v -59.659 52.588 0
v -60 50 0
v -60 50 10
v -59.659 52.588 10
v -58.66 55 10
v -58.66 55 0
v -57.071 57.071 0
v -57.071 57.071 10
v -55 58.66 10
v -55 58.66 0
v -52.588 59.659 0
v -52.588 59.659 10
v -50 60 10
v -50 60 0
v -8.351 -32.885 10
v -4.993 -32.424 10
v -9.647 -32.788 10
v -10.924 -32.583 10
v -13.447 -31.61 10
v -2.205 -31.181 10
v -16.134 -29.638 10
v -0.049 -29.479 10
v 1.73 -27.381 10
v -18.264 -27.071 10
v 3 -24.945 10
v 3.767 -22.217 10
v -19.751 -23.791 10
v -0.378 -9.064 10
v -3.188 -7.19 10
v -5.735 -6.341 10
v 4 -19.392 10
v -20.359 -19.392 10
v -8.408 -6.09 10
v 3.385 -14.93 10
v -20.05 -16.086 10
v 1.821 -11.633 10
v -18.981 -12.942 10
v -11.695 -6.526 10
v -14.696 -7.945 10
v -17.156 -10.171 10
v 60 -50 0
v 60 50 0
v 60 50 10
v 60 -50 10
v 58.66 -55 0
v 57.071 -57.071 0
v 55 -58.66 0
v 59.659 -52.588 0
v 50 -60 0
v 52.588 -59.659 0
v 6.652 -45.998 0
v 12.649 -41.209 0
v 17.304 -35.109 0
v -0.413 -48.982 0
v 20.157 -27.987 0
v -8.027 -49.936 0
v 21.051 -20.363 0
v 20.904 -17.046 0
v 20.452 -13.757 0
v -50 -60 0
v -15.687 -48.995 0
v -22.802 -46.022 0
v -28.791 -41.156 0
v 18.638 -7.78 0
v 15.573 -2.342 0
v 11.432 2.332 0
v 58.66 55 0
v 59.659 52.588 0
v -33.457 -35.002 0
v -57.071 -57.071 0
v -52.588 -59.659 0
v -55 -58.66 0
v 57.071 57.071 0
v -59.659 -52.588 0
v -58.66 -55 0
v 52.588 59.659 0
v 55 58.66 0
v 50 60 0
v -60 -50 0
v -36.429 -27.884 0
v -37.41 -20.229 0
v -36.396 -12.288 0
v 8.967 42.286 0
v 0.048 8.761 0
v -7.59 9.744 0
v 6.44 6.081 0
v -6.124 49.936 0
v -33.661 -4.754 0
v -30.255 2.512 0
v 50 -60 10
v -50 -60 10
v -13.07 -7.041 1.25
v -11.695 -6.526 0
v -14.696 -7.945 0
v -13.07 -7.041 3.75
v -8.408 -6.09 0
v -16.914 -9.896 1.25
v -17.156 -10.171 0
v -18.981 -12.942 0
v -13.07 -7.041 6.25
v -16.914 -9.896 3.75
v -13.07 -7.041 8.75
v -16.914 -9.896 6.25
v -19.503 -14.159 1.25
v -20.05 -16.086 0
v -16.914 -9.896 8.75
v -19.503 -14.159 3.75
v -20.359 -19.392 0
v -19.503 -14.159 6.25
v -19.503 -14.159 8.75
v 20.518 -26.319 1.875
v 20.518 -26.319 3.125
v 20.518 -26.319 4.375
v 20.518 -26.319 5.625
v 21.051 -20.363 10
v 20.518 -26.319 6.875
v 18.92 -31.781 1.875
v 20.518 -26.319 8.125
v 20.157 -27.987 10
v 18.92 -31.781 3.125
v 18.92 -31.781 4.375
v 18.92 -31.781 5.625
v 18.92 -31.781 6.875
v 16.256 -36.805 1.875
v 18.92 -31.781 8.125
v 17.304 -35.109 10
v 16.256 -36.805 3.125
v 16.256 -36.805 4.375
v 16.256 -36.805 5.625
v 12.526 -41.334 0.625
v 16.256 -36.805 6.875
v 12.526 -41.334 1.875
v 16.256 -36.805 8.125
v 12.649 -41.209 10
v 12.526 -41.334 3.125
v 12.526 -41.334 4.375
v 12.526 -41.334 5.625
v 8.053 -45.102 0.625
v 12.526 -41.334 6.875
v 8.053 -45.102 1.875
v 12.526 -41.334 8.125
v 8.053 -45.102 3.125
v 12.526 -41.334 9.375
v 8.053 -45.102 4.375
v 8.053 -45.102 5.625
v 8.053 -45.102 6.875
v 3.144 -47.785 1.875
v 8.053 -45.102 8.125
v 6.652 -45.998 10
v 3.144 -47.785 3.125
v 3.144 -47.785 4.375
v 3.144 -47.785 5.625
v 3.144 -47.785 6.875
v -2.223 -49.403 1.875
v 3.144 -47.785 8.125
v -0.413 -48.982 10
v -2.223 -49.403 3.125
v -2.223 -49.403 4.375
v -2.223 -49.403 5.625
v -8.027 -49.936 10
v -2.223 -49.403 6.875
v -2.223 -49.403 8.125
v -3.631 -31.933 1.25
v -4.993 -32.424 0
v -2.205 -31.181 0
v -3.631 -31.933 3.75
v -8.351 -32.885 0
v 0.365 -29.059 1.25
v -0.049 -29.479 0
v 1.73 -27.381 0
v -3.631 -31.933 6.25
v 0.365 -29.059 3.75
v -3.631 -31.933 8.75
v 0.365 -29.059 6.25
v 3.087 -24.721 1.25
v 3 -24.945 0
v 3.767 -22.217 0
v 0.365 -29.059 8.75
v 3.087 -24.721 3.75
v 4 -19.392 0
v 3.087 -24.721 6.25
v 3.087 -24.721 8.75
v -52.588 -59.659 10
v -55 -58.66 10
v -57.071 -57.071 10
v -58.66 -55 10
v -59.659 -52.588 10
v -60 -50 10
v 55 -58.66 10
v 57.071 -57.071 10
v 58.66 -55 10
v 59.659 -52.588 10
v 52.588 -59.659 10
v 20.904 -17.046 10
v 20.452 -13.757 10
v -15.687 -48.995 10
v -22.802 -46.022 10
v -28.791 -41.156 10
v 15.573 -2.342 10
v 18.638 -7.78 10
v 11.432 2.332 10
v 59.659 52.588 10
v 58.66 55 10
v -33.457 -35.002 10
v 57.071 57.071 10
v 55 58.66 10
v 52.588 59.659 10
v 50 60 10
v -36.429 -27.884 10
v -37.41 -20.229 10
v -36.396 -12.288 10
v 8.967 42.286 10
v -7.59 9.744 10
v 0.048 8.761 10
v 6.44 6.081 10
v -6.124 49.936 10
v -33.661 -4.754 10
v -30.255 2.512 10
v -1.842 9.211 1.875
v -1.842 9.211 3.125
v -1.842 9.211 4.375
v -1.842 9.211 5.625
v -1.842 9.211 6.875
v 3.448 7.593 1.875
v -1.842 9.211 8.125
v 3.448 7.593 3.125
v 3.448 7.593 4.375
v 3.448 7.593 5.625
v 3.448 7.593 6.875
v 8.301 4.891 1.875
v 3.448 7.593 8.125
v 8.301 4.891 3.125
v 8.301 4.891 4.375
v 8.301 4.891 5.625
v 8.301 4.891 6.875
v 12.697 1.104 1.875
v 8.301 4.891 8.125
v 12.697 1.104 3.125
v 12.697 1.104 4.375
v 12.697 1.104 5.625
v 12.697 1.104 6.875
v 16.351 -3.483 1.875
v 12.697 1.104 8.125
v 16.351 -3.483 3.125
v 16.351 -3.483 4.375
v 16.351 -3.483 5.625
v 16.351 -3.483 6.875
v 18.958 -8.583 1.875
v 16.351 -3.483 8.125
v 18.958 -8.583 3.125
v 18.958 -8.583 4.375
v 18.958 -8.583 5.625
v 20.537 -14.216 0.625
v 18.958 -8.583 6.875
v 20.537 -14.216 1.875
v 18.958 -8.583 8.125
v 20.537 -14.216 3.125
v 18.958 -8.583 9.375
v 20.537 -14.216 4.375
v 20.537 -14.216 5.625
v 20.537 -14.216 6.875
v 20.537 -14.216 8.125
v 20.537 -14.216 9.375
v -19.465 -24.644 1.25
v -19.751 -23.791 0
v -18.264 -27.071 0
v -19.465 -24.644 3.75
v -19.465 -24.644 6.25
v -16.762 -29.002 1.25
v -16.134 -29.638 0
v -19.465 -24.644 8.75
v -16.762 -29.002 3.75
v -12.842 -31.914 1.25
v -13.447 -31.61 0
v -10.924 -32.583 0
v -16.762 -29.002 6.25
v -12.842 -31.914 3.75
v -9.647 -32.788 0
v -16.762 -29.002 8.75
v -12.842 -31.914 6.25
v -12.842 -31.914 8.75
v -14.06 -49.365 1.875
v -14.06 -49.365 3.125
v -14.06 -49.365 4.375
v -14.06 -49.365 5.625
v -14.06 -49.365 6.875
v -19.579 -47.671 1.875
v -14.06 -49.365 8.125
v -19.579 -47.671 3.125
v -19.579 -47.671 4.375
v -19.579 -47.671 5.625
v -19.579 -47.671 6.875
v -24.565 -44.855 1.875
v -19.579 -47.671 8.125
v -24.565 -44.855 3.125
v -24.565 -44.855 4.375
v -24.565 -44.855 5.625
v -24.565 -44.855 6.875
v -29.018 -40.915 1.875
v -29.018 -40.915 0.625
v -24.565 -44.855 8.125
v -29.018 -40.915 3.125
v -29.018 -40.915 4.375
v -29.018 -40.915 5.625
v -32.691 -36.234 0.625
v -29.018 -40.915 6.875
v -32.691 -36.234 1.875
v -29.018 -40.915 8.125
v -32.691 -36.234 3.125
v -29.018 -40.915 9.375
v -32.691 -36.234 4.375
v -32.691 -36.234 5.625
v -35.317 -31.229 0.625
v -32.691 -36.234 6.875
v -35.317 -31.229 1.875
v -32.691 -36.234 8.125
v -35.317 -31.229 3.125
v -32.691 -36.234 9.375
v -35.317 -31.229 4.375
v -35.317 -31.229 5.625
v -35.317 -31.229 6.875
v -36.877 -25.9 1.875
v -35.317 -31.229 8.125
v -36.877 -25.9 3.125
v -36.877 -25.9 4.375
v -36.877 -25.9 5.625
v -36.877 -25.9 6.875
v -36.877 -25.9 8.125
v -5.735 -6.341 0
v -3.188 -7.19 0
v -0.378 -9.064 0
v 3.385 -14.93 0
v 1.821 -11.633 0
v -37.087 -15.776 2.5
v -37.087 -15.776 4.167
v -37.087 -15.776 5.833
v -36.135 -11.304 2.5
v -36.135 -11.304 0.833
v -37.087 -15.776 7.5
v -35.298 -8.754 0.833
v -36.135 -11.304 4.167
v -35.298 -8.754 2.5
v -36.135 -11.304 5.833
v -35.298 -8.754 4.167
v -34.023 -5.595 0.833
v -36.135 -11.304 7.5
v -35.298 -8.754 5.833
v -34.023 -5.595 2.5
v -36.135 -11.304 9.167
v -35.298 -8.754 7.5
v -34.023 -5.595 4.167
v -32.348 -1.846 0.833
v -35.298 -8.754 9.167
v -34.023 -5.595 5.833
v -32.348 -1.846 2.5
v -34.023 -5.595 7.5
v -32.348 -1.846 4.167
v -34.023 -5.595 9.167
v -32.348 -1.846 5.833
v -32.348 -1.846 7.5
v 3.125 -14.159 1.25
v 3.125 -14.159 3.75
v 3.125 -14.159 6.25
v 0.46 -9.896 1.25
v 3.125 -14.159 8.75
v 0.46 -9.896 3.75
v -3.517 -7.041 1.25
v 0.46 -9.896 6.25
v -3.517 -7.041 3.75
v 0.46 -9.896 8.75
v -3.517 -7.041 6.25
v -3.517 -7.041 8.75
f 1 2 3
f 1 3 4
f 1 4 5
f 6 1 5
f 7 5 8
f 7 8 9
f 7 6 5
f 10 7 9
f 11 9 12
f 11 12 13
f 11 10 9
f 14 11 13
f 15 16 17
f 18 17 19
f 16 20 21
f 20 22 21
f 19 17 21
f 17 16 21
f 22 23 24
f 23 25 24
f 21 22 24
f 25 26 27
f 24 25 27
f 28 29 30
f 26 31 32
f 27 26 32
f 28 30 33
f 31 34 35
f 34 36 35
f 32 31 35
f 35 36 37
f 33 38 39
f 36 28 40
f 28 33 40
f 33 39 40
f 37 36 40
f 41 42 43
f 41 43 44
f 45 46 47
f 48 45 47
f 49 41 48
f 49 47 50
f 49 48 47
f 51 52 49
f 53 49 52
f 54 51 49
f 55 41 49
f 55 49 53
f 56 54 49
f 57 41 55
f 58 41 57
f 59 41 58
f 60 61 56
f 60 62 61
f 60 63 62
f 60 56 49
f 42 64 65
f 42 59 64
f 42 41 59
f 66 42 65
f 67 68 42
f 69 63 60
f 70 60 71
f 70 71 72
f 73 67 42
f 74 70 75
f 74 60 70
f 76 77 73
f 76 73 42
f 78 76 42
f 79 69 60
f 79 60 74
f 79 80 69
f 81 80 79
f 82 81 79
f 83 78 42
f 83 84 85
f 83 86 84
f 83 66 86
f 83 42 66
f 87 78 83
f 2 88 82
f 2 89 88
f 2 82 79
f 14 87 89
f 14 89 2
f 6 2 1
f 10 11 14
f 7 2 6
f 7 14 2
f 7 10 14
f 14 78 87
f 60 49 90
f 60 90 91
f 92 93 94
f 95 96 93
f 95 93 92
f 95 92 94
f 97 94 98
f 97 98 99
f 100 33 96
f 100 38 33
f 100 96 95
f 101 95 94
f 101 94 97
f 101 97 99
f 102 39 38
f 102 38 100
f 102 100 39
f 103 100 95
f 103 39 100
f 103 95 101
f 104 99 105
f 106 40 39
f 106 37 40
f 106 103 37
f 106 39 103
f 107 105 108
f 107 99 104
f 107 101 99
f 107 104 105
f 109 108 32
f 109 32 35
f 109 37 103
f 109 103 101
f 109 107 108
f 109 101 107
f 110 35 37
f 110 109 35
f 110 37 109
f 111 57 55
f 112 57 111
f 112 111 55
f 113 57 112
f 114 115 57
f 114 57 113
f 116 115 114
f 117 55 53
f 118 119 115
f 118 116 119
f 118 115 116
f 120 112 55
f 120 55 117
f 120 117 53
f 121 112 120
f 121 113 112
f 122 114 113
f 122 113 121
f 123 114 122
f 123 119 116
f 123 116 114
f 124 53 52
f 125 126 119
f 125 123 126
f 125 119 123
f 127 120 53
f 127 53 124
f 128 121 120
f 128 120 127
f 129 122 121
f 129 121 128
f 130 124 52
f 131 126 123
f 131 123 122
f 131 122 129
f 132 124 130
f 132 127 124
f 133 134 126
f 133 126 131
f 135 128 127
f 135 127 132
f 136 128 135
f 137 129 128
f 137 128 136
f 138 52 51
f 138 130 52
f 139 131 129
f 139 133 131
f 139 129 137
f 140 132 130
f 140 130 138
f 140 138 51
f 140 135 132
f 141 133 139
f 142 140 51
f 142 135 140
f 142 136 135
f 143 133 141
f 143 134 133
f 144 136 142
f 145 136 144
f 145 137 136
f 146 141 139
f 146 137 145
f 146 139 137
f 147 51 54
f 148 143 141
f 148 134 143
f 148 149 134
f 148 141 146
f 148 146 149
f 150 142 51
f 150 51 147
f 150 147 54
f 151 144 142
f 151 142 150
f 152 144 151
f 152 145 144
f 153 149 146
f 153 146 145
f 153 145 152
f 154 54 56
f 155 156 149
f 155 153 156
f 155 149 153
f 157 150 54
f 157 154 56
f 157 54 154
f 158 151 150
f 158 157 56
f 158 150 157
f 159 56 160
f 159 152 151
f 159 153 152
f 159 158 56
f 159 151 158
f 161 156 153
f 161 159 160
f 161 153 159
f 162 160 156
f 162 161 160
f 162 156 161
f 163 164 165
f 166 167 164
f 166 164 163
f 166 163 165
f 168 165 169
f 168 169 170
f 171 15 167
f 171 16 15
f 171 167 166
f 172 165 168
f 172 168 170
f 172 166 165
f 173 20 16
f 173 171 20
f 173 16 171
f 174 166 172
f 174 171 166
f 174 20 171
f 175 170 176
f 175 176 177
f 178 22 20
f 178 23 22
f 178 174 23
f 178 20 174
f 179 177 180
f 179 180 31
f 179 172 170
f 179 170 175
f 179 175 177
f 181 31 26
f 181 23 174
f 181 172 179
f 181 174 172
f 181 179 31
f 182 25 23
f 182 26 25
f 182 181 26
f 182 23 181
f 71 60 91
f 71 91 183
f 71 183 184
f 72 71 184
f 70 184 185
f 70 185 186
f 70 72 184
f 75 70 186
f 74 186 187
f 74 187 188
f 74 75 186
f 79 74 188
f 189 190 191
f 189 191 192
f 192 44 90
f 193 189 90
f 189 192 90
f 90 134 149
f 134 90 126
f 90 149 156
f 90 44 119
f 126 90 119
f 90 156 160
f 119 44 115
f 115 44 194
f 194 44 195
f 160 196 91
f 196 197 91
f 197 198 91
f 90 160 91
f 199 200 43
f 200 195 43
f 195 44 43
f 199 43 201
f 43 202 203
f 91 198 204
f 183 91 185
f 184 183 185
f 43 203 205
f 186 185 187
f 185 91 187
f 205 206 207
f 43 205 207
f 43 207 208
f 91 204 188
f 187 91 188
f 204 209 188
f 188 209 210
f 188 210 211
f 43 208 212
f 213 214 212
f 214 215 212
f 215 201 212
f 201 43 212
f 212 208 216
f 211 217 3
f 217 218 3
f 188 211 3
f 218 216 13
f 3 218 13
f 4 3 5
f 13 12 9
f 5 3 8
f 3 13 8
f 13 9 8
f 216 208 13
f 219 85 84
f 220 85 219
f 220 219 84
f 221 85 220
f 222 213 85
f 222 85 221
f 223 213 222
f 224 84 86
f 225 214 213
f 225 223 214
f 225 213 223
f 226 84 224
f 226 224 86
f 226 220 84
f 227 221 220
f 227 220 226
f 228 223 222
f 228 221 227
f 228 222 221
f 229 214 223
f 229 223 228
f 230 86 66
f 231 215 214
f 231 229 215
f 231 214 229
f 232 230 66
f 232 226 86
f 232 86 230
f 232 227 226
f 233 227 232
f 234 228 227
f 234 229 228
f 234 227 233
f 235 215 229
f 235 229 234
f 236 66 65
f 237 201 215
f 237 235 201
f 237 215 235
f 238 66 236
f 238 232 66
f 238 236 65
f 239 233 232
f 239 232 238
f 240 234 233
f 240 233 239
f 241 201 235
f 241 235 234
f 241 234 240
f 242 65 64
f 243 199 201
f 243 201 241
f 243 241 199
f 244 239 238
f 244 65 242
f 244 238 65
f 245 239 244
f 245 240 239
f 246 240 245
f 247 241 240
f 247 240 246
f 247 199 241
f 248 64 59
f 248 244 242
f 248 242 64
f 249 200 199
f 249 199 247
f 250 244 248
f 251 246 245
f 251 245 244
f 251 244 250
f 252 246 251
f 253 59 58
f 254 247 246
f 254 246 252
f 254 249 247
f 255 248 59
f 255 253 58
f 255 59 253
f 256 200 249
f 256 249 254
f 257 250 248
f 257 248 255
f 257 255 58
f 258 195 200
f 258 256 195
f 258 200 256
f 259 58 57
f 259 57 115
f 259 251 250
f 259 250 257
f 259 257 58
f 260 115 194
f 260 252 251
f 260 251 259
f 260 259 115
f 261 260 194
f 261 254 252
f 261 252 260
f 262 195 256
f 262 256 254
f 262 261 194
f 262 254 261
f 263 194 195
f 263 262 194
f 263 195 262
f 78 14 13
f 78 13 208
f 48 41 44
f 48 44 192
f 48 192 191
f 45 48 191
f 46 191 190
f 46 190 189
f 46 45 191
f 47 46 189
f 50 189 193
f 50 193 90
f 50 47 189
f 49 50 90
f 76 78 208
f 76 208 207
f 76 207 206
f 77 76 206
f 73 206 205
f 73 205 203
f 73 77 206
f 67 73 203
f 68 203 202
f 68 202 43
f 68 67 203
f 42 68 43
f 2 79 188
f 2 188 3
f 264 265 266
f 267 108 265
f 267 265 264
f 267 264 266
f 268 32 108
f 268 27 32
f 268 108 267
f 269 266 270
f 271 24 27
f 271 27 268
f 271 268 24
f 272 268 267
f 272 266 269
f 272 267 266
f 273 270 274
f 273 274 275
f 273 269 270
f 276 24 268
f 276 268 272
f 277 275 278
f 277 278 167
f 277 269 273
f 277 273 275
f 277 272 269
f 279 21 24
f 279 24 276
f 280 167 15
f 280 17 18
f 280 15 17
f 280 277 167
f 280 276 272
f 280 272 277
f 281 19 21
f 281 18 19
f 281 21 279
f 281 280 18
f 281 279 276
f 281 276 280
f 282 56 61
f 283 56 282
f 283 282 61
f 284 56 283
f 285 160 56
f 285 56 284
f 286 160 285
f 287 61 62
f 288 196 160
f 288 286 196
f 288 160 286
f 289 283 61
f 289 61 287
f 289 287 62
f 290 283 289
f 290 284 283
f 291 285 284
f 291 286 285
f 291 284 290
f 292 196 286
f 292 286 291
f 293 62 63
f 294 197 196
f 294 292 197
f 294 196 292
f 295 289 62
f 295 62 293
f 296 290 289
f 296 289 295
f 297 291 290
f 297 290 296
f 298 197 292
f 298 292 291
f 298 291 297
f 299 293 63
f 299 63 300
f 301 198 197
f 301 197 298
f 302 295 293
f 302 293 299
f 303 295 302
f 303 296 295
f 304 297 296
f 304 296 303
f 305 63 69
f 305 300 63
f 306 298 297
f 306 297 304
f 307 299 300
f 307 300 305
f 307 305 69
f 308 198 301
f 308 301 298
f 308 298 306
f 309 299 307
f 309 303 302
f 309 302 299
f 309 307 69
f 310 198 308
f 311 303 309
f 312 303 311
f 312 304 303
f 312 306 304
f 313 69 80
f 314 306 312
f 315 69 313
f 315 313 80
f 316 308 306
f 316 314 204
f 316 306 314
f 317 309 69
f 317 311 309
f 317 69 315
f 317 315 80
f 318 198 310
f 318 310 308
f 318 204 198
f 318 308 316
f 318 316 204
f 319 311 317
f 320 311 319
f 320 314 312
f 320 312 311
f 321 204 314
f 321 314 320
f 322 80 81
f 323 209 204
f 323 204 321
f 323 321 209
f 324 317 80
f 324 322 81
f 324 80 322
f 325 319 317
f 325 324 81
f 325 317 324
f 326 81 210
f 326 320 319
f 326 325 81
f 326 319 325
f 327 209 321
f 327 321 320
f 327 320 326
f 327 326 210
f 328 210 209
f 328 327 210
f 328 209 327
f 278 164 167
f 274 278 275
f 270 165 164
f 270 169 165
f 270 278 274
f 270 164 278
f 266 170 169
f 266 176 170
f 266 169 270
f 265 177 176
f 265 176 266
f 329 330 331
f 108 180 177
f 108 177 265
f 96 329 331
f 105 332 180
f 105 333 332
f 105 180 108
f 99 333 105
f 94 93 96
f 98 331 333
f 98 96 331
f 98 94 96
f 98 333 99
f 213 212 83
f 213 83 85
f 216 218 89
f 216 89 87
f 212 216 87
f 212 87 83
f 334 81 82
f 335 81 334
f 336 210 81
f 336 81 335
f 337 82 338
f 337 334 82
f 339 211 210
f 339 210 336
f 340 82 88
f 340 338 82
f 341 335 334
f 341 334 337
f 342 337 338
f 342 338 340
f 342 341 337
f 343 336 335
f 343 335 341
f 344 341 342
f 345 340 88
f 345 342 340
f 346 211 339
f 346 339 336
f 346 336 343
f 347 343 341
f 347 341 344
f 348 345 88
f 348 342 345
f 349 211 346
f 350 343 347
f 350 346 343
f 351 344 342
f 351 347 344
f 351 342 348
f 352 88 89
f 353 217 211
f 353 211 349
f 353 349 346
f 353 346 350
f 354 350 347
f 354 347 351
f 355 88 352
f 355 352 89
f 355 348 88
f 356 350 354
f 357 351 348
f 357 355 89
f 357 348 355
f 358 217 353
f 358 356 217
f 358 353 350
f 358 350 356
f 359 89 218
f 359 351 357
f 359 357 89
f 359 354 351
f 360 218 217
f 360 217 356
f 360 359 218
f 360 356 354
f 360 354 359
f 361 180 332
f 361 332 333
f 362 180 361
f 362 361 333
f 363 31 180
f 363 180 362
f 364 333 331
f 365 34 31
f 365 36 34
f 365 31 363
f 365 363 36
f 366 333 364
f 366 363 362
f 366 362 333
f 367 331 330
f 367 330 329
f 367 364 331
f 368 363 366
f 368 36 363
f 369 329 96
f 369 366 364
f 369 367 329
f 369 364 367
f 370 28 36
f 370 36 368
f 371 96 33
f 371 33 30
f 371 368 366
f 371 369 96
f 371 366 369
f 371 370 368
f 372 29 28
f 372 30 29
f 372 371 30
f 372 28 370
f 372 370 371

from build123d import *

# Parameters (mm, degrees)
BOSS_EXTRUDE1_DEPTH = 10
CUT_EXTRUDE4_DEPTH  = 10


with BuildPart() as part:
    # Sketch1 → Boss-Extrude1 (new body)
    with BuildSketch(Plane.XY):
        with BuildLine():
            Line((-50, 60), (50, 60))
            ThreePointArc((50, 60), (57.071067812, 57.071067812), (60, 50))
            Line((60, 50), (60, -50))
            ThreePointArc((60, -50), (57.071067812, -57.071067812), (50, -60))
            Line((50, -60), (-50, -60))
            ThreePointArc((-50, -60), (-57.071067812, -57.071067812), (-60, -50))
            Line((-60, -50), (-60, 50))
            ThreePointArc((-60, 50), (-57.071067812, 57.071067812), (-50, 60))
        make_face()
    extrude(amount=BOSS_EXTRUDE1_DEPTH)

    # Sketch2 → Cut-Extrude4 (cut)
    with BuildSketch(Plane.XY.offset(10)):
        with BuildLine():
            Line((-6.124198718, 49.935897436), (8.966947115, 42.285657051))
            Line((8.966947115, 42.285657051), (-7.589543269, 9.743589744))
            add(Edge.make_bspline(
                [(-7.589543269, 9.743589744), (-6.611401353, 9.718265156), (-4.684790438, 9.668384228), (-1.850173407, 9.265238226), (0.859773239, 8.568295456), (3.472373776, 7.644499699), (5.955691637, 6.403832822), (8.349722036, 4.927994847), (10.5925302, 3.128051695), (12.735541798, 1.133810178), (14.684171235, -1.075522815), (16.376900405, -3.4495213), (17.852083993, -5.930425603), (18.998832346, -8.573739573), (19.923837754, -11.335647275), (20.591269863, -14.227189241), (20.972058555, -17.25673874), (21.024556627, -19.314848948), (21.051282051, -20.362580128)],
                knots=[0, 0, 0, 0, 1.013260694, 1.995783107, 2.958651975, 3.908806537, 4.861209129, 5.829647963, 6.817170299, 7.835534541, 8.860094905, 9.863329007, 10.853101798, 11.844815043, 12.84250023, 13.867713965, 14.914507806, 16, 16, 16, 16], degree=3))
            add(Edge.make_bspline(
                [(21.051282051, -20.362580128), (21.026238117, -21.372529431), (20.976736999, -23.36876612), (20.567544726, -26.300730118), (19.906268516, -29.113778112), (18.961172021, -31.802292095), (17.759877945, -34.379413601), (16.290776659, -36.84363035), (14.541684822, -39.176528058), (12.557794128, -41.365710829), (10.389059356, -43.361167109), (8.103094783, -45.134844784), (5.680529431, -46.599969838), (3.167152621, -47.837302292), (0.51669155, -48.760620347), (-2.231189506, -49.457565528), (-5.097328522, -49.859733154), (-7.042790252, -49.910306188), (-8.02724359, -49.935897436)],
                knots=[0, 0, 0, 0, 1.049934834, 2.075270938, 3.072134561, 4.05064612, 5.033440221, 6.024524368, 7.028587226, 8.060776465, 9.092543989, 10.090062252, 11.064205434, 12.031961459, 12.998029633, 13.977230324, 14.976426867, 16, 16, 16, 16], degree=3))
            add(Edge.make_bspline(
                [(-8.02724359, -49.935897436), (-9.056682618, -49.914896057), (-11.080935178, -49.873599687), (-14.042923287, -49.411189181), (-16.883724805, -48.715094627), (-19.587373971, -47.72118987), (-22.170683973, -46.455640691), (-24.603240995, -44.889650868), (-26.905535958, -43.040489076), (-29.053023033, -40.949758538), (-30.98774885, -38.65964929), (-32.713362576, -36.281919647), (-34.173234017, -33.812838423), (-35.354965917, -31.255045538), (-36.276980553, -28.616691514), (-36.918514688, -25.892768969), (-37.336533382, -23.090503107), (-37.385536538, -21.188726918), (-37.41025641, -20.229366987)],
                knots=[0, 0, 0, 0, 1.063775006, 2.091769615, 3.092589432, 4.084662827, 5.064601646, 6.061867366, 7.070035304, 8.113879863, 9.156342271, 10.166834137, 11.149076039, 12.117706134, 13.076241869, 14.034148791, 15.008317125, 16, 16, 16, 16], degree=3))
            add(Edge.make_bspline(
                [(-37.41025641, -20.229366987), (-37.397194915, -19.48645495), (-37.37099922, -17.996495521), (-37.107748141, -15.765362242), (-36.707514033, -13.528372449), (-36.243590299, -11.640729627), (-35.765888506, -10.044530074), (-35.285077983, -8.693709525), (-34.68921928, -7.194594085), (-34.008064519, -5.54335562), (-33.220193861, -3.741980566), (-32.329723004, -1.795379002), (-31.334435069, 0.311190202), (-30.624657691, 1.758077055), (-30.254807692, 2.512019231)],
                knots=[0, 0, 0, 0, 1.110454016, 2.227089276, 3.35462975, 4.507227546, 5.131400587, 5.845402449, 6.650387134, 7.543487832, 8.516250726, 9.590168902, 10.744287919, 12, 12, 12, 12], degree=3))
            Line((-30.254807692, 2.512019231), (-6.124198718, 49.935897436))
        make_face()
        with BuildLine():
            add(Edge.make_bspline(
                [(-8.407852564, -6.08974359), (-9.226024974, -6.127271429), (-10.827080981, -6.200708486), (-13.103543184, -6.969777088), (-15.179160216, -8.176254317), (-16.978330731, -9.856507181), (-18.48317132, -11.864475335), (-19.588980983, -14.154831224), (-20.254186954, -16.697010679), (-20.323297594, -18.474460173), (-20.358974359, -19.392027244)],
                knots=[0, 0, 0, 0, 0.981744412, 1.921144944, 2.858899012, 3.85339082, 4.86292663, 5.863643845, 6.897155691, 8, 8, 8, 8], degree=3))
            add(Edge.make_bspline(
                [(-20.358974359, -19.392027244), (-20.316731952, -20.309899867), (-20.234567647, -22.095223475), (-19.544349062, -24.661609016), (-18.414247075, -27.003976231), (-16.829351099, -29.038554326), (-14.968706005, -30.727411663), (-12.905471285, -31.976402421), (-10.674062437, -32.743698427), (-9.130542441, -32.83731872), (-8.350761218, -32.884615385)],
                knots=[0, 0, 0, 0, 1.098279937, 2.136227893, 3.159405121, 4.194678092, 5.206500211, 6.154139736, 7.067477469, 8, 8, 8, 8], degree=3))
            add(Edge.make_bspline(
                [(-8.350761218, -32.884615385), (-7.527224111, -32.836476333), (-5.912124811, -32.742067292), (-3.582238145, -32.007057701), (-1.453872696, -30.778991633), (0.428014058, -29.095541313), (2.044519018, -27.084180493), (3.162977168, -24.728054541), (3.885104863, -22.143145743), (3.960842941, -20.329627504), (4, -19.392027244)],
                knots=[0, 0, 0, 0, 0.96921794, 1.900804717, 2.848419905, 3.844199796, 4.861108892, 5.867439427, 6.897452859, 8, 8, 8, 8], degree=3))
            add(Edge.make_bspline(
                [(4, -19.392027244), (3.955392956, -18.474995927), (3.869006208, -16.69905771), (3.220139362, -14.144968729), (2.061631424, -11.863440716), (0.522742602, -9.848218605), (-1.338345813, -8.168714968), (-3.49703327, -6.960262431), (-5.877488064, -6.202071026), (-7.552100104, -6.127731982), (-8.407852564, -6.08974359)],
                knots=[0, 0, 0, 0, 1.083229974, 2.097801324, 3.086792542, 4.086858909, 5.079819718, 6.026392613, 6.991456328, 8, 8, 8, 8], degree=3))
        make_face(mode=Mode.SUBTRACT)
    extrude(amount=-CUT_EXTRUDE4_DEPTH, mode=Mode.SUBTRACT)


with BuildPart() as cut_extrude4_piece_1:
    # of the separate pieces the step leaves, piece 1, a body of its own (cut_extrude4_pieces)
    add(part.part.solids().sort_by_distance((-50, 60, 0))[0])


with BuildPart() as cut_extrude4_piece_2:
    # of the separate pieces the step leaves, piece 2, a body of its own (cut_extrude4_pieces)
    add(part.part.solids().sort_by_distance((-8.407852564, -6.08974359, 0))[0])


solid = Compound([cut_extrude4_piece_1.part, cut_extrude4_piece_2.part])
